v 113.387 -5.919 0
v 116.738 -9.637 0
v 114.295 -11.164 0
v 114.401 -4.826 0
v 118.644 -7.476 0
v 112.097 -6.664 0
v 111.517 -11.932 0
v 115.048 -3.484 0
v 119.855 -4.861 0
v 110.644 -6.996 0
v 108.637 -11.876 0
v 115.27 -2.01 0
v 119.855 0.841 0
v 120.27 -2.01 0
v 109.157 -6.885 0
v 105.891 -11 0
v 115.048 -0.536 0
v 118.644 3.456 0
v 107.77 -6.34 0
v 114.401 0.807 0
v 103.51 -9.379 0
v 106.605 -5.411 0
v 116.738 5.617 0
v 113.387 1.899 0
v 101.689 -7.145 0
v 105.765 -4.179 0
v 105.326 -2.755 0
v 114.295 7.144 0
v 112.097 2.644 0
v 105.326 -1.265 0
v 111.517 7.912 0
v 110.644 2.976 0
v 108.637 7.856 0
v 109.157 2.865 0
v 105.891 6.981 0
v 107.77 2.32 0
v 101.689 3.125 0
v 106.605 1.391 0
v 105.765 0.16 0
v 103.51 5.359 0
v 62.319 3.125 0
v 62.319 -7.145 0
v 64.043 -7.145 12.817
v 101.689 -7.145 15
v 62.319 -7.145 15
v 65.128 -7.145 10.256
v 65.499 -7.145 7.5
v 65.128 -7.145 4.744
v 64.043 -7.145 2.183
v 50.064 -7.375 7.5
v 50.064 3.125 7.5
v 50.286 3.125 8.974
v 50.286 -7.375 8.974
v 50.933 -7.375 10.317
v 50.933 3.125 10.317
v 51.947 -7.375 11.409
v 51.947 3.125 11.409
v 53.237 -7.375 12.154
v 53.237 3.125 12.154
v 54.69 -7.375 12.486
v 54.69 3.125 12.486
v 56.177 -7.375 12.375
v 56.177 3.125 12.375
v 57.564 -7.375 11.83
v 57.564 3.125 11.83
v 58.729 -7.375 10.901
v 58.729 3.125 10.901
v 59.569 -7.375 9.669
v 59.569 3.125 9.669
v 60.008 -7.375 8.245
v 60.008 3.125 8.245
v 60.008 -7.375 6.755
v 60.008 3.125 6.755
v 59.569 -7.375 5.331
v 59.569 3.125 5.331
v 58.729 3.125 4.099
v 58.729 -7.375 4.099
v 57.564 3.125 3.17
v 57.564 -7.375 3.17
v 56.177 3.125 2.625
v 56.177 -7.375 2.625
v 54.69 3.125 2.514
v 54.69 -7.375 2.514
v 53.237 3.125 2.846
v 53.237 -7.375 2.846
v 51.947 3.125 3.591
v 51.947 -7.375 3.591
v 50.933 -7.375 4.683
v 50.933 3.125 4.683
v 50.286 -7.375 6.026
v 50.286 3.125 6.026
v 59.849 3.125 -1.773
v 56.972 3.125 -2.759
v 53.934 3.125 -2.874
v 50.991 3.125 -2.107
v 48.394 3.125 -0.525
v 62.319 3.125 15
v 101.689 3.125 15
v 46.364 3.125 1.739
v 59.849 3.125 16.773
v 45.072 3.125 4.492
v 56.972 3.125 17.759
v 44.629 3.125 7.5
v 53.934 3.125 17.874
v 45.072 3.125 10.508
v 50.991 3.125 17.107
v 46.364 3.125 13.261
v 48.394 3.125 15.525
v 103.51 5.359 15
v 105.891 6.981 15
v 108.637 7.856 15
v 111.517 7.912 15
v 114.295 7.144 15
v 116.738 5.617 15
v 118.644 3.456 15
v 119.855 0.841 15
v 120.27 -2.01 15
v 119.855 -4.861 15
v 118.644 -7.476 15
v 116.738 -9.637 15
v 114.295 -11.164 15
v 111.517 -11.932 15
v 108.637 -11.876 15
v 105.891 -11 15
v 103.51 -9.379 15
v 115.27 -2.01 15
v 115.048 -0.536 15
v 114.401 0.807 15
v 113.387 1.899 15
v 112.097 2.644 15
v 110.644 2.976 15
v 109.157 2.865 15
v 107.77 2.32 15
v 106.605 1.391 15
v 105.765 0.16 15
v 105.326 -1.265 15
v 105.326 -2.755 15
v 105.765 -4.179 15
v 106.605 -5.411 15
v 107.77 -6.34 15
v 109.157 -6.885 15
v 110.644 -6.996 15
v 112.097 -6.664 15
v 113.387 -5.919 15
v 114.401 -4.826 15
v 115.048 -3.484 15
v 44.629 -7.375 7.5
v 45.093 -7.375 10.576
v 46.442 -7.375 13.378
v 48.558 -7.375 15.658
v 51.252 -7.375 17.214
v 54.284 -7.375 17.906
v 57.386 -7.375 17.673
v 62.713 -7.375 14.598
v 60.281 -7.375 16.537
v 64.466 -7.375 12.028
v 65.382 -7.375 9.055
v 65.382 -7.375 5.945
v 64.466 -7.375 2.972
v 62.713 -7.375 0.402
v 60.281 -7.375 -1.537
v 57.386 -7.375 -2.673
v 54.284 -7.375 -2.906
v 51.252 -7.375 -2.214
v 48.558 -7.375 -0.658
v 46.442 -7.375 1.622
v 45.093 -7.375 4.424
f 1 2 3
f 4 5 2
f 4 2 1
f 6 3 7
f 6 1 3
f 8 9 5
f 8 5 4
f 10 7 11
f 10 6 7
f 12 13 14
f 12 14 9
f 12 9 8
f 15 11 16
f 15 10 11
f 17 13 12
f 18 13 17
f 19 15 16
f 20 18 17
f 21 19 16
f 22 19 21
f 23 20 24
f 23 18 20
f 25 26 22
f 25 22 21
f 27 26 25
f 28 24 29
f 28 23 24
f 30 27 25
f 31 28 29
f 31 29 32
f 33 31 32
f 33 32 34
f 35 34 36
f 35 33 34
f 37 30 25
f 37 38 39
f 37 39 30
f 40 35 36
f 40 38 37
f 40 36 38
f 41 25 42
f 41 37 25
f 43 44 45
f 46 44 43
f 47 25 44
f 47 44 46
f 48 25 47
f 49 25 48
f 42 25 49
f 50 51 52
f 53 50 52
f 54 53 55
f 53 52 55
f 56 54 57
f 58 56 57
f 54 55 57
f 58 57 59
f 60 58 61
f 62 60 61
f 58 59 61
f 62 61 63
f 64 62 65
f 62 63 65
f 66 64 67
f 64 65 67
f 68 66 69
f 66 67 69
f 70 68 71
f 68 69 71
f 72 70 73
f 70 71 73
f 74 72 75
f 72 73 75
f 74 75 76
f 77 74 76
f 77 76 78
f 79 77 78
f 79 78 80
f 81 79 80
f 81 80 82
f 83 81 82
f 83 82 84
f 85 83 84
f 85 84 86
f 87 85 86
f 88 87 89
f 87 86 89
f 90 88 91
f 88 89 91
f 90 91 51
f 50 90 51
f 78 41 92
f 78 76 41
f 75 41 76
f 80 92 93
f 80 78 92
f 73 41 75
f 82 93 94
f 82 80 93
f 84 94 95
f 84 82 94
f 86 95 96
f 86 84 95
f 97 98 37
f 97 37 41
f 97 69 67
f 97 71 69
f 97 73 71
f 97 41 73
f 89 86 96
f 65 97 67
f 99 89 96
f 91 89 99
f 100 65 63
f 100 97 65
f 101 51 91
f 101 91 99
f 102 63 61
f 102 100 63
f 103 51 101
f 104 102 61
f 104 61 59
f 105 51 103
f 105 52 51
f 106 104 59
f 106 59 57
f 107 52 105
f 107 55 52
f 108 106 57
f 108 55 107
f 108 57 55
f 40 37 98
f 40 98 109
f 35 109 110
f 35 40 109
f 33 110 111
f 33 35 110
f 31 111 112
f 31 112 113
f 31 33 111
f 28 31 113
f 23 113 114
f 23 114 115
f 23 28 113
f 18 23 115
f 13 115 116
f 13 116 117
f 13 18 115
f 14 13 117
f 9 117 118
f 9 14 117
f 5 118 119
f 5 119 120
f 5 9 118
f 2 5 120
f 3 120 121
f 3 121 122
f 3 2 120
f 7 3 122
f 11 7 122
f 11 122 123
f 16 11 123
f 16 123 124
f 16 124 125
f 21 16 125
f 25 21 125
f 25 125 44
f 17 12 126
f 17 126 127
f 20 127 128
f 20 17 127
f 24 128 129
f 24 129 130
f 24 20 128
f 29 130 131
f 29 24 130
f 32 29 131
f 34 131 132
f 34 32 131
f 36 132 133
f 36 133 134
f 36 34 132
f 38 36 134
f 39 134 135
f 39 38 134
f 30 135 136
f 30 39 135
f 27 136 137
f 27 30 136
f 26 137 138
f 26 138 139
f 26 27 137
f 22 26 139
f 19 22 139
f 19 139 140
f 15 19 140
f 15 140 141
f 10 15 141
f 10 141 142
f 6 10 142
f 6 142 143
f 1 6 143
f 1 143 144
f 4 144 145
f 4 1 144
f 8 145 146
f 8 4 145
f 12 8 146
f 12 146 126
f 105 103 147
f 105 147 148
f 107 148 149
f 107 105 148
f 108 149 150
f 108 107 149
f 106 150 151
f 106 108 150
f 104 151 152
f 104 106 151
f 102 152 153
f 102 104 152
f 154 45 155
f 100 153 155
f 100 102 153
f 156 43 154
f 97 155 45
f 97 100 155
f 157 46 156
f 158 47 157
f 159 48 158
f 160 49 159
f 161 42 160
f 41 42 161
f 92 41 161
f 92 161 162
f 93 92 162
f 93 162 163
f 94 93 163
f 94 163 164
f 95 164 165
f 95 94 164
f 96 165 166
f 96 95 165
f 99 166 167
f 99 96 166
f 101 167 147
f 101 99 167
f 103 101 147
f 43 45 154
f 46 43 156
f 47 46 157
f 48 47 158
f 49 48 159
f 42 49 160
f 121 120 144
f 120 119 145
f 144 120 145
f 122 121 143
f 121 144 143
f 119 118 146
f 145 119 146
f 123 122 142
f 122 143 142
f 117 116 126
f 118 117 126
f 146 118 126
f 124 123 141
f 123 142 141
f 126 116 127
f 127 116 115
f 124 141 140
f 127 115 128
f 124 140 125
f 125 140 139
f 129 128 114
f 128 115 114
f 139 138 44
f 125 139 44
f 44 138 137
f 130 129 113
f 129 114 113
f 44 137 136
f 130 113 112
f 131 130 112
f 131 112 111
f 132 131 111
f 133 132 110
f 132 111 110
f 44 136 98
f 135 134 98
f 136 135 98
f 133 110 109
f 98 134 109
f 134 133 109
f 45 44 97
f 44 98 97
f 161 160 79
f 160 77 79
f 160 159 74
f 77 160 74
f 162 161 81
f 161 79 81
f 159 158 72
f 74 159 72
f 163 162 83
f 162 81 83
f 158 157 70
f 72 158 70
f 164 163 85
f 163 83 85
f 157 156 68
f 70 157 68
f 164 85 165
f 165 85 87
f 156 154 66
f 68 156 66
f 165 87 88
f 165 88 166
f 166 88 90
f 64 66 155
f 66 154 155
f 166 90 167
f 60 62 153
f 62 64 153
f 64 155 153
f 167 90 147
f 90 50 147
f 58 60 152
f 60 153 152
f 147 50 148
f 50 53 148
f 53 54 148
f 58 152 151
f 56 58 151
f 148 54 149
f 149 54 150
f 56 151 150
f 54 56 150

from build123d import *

# Parameters (mm, degrees)
SKETCH4_R           = 5
BOSS_EXTRUDE6_DEPTH = 15
SKETCH9_R           = 10.43494917
SKETCH9_R_2         = 5
BOSS_EXTRUDE8_DEPTH = 10.5


with BuildPart() as part:
    # Sketch4 → Boss-Extrude6 (new body)
    with BuildSketch(Plane.XY):
        with BuildLine():
            Line((101.689180826, -7.145205758), (62.319180826, -7.145205758))
            Line((62.319180826, -7.145205758), (62.319180826, 3.125413503))
            Line((62.319180826, 3.125413503), (101.689180826, 3.125413503))
            ThreePointArc((101.689180826, 3.125413503), (120.269891461, -2.009896128), (101.689180826, -7.145205758))
        make_face()
        with Locations((110.269891461, -2.009896128)):
            Circle(SKETCH4_R, mode=Mode.SUBTRACT)
    extrude(amount=BOSS_EXTRUDE6_DEPTH)

    # Sketch9 → Boss-Extrude8 (add)
    with BuildSketch(Plane(origin=(0, 3.125413503, 0), x_dir=(1, 0, 0), z_dir=(0, 1, 0))):
        with Locations(Location((55.063964483, -7.5, 0), (0, 0, 180))):
            Circle(SKETCH9_R)
        with Locations(Location((55.063964483, -7.5, 0), (0, 0, 180))):
            Circle(SKETCH9_R_2, mode=Mode.SUBTRACT)
    extrude(amount=-BOSS_EXTRUDE8_DEPTH)


solid = part.part
